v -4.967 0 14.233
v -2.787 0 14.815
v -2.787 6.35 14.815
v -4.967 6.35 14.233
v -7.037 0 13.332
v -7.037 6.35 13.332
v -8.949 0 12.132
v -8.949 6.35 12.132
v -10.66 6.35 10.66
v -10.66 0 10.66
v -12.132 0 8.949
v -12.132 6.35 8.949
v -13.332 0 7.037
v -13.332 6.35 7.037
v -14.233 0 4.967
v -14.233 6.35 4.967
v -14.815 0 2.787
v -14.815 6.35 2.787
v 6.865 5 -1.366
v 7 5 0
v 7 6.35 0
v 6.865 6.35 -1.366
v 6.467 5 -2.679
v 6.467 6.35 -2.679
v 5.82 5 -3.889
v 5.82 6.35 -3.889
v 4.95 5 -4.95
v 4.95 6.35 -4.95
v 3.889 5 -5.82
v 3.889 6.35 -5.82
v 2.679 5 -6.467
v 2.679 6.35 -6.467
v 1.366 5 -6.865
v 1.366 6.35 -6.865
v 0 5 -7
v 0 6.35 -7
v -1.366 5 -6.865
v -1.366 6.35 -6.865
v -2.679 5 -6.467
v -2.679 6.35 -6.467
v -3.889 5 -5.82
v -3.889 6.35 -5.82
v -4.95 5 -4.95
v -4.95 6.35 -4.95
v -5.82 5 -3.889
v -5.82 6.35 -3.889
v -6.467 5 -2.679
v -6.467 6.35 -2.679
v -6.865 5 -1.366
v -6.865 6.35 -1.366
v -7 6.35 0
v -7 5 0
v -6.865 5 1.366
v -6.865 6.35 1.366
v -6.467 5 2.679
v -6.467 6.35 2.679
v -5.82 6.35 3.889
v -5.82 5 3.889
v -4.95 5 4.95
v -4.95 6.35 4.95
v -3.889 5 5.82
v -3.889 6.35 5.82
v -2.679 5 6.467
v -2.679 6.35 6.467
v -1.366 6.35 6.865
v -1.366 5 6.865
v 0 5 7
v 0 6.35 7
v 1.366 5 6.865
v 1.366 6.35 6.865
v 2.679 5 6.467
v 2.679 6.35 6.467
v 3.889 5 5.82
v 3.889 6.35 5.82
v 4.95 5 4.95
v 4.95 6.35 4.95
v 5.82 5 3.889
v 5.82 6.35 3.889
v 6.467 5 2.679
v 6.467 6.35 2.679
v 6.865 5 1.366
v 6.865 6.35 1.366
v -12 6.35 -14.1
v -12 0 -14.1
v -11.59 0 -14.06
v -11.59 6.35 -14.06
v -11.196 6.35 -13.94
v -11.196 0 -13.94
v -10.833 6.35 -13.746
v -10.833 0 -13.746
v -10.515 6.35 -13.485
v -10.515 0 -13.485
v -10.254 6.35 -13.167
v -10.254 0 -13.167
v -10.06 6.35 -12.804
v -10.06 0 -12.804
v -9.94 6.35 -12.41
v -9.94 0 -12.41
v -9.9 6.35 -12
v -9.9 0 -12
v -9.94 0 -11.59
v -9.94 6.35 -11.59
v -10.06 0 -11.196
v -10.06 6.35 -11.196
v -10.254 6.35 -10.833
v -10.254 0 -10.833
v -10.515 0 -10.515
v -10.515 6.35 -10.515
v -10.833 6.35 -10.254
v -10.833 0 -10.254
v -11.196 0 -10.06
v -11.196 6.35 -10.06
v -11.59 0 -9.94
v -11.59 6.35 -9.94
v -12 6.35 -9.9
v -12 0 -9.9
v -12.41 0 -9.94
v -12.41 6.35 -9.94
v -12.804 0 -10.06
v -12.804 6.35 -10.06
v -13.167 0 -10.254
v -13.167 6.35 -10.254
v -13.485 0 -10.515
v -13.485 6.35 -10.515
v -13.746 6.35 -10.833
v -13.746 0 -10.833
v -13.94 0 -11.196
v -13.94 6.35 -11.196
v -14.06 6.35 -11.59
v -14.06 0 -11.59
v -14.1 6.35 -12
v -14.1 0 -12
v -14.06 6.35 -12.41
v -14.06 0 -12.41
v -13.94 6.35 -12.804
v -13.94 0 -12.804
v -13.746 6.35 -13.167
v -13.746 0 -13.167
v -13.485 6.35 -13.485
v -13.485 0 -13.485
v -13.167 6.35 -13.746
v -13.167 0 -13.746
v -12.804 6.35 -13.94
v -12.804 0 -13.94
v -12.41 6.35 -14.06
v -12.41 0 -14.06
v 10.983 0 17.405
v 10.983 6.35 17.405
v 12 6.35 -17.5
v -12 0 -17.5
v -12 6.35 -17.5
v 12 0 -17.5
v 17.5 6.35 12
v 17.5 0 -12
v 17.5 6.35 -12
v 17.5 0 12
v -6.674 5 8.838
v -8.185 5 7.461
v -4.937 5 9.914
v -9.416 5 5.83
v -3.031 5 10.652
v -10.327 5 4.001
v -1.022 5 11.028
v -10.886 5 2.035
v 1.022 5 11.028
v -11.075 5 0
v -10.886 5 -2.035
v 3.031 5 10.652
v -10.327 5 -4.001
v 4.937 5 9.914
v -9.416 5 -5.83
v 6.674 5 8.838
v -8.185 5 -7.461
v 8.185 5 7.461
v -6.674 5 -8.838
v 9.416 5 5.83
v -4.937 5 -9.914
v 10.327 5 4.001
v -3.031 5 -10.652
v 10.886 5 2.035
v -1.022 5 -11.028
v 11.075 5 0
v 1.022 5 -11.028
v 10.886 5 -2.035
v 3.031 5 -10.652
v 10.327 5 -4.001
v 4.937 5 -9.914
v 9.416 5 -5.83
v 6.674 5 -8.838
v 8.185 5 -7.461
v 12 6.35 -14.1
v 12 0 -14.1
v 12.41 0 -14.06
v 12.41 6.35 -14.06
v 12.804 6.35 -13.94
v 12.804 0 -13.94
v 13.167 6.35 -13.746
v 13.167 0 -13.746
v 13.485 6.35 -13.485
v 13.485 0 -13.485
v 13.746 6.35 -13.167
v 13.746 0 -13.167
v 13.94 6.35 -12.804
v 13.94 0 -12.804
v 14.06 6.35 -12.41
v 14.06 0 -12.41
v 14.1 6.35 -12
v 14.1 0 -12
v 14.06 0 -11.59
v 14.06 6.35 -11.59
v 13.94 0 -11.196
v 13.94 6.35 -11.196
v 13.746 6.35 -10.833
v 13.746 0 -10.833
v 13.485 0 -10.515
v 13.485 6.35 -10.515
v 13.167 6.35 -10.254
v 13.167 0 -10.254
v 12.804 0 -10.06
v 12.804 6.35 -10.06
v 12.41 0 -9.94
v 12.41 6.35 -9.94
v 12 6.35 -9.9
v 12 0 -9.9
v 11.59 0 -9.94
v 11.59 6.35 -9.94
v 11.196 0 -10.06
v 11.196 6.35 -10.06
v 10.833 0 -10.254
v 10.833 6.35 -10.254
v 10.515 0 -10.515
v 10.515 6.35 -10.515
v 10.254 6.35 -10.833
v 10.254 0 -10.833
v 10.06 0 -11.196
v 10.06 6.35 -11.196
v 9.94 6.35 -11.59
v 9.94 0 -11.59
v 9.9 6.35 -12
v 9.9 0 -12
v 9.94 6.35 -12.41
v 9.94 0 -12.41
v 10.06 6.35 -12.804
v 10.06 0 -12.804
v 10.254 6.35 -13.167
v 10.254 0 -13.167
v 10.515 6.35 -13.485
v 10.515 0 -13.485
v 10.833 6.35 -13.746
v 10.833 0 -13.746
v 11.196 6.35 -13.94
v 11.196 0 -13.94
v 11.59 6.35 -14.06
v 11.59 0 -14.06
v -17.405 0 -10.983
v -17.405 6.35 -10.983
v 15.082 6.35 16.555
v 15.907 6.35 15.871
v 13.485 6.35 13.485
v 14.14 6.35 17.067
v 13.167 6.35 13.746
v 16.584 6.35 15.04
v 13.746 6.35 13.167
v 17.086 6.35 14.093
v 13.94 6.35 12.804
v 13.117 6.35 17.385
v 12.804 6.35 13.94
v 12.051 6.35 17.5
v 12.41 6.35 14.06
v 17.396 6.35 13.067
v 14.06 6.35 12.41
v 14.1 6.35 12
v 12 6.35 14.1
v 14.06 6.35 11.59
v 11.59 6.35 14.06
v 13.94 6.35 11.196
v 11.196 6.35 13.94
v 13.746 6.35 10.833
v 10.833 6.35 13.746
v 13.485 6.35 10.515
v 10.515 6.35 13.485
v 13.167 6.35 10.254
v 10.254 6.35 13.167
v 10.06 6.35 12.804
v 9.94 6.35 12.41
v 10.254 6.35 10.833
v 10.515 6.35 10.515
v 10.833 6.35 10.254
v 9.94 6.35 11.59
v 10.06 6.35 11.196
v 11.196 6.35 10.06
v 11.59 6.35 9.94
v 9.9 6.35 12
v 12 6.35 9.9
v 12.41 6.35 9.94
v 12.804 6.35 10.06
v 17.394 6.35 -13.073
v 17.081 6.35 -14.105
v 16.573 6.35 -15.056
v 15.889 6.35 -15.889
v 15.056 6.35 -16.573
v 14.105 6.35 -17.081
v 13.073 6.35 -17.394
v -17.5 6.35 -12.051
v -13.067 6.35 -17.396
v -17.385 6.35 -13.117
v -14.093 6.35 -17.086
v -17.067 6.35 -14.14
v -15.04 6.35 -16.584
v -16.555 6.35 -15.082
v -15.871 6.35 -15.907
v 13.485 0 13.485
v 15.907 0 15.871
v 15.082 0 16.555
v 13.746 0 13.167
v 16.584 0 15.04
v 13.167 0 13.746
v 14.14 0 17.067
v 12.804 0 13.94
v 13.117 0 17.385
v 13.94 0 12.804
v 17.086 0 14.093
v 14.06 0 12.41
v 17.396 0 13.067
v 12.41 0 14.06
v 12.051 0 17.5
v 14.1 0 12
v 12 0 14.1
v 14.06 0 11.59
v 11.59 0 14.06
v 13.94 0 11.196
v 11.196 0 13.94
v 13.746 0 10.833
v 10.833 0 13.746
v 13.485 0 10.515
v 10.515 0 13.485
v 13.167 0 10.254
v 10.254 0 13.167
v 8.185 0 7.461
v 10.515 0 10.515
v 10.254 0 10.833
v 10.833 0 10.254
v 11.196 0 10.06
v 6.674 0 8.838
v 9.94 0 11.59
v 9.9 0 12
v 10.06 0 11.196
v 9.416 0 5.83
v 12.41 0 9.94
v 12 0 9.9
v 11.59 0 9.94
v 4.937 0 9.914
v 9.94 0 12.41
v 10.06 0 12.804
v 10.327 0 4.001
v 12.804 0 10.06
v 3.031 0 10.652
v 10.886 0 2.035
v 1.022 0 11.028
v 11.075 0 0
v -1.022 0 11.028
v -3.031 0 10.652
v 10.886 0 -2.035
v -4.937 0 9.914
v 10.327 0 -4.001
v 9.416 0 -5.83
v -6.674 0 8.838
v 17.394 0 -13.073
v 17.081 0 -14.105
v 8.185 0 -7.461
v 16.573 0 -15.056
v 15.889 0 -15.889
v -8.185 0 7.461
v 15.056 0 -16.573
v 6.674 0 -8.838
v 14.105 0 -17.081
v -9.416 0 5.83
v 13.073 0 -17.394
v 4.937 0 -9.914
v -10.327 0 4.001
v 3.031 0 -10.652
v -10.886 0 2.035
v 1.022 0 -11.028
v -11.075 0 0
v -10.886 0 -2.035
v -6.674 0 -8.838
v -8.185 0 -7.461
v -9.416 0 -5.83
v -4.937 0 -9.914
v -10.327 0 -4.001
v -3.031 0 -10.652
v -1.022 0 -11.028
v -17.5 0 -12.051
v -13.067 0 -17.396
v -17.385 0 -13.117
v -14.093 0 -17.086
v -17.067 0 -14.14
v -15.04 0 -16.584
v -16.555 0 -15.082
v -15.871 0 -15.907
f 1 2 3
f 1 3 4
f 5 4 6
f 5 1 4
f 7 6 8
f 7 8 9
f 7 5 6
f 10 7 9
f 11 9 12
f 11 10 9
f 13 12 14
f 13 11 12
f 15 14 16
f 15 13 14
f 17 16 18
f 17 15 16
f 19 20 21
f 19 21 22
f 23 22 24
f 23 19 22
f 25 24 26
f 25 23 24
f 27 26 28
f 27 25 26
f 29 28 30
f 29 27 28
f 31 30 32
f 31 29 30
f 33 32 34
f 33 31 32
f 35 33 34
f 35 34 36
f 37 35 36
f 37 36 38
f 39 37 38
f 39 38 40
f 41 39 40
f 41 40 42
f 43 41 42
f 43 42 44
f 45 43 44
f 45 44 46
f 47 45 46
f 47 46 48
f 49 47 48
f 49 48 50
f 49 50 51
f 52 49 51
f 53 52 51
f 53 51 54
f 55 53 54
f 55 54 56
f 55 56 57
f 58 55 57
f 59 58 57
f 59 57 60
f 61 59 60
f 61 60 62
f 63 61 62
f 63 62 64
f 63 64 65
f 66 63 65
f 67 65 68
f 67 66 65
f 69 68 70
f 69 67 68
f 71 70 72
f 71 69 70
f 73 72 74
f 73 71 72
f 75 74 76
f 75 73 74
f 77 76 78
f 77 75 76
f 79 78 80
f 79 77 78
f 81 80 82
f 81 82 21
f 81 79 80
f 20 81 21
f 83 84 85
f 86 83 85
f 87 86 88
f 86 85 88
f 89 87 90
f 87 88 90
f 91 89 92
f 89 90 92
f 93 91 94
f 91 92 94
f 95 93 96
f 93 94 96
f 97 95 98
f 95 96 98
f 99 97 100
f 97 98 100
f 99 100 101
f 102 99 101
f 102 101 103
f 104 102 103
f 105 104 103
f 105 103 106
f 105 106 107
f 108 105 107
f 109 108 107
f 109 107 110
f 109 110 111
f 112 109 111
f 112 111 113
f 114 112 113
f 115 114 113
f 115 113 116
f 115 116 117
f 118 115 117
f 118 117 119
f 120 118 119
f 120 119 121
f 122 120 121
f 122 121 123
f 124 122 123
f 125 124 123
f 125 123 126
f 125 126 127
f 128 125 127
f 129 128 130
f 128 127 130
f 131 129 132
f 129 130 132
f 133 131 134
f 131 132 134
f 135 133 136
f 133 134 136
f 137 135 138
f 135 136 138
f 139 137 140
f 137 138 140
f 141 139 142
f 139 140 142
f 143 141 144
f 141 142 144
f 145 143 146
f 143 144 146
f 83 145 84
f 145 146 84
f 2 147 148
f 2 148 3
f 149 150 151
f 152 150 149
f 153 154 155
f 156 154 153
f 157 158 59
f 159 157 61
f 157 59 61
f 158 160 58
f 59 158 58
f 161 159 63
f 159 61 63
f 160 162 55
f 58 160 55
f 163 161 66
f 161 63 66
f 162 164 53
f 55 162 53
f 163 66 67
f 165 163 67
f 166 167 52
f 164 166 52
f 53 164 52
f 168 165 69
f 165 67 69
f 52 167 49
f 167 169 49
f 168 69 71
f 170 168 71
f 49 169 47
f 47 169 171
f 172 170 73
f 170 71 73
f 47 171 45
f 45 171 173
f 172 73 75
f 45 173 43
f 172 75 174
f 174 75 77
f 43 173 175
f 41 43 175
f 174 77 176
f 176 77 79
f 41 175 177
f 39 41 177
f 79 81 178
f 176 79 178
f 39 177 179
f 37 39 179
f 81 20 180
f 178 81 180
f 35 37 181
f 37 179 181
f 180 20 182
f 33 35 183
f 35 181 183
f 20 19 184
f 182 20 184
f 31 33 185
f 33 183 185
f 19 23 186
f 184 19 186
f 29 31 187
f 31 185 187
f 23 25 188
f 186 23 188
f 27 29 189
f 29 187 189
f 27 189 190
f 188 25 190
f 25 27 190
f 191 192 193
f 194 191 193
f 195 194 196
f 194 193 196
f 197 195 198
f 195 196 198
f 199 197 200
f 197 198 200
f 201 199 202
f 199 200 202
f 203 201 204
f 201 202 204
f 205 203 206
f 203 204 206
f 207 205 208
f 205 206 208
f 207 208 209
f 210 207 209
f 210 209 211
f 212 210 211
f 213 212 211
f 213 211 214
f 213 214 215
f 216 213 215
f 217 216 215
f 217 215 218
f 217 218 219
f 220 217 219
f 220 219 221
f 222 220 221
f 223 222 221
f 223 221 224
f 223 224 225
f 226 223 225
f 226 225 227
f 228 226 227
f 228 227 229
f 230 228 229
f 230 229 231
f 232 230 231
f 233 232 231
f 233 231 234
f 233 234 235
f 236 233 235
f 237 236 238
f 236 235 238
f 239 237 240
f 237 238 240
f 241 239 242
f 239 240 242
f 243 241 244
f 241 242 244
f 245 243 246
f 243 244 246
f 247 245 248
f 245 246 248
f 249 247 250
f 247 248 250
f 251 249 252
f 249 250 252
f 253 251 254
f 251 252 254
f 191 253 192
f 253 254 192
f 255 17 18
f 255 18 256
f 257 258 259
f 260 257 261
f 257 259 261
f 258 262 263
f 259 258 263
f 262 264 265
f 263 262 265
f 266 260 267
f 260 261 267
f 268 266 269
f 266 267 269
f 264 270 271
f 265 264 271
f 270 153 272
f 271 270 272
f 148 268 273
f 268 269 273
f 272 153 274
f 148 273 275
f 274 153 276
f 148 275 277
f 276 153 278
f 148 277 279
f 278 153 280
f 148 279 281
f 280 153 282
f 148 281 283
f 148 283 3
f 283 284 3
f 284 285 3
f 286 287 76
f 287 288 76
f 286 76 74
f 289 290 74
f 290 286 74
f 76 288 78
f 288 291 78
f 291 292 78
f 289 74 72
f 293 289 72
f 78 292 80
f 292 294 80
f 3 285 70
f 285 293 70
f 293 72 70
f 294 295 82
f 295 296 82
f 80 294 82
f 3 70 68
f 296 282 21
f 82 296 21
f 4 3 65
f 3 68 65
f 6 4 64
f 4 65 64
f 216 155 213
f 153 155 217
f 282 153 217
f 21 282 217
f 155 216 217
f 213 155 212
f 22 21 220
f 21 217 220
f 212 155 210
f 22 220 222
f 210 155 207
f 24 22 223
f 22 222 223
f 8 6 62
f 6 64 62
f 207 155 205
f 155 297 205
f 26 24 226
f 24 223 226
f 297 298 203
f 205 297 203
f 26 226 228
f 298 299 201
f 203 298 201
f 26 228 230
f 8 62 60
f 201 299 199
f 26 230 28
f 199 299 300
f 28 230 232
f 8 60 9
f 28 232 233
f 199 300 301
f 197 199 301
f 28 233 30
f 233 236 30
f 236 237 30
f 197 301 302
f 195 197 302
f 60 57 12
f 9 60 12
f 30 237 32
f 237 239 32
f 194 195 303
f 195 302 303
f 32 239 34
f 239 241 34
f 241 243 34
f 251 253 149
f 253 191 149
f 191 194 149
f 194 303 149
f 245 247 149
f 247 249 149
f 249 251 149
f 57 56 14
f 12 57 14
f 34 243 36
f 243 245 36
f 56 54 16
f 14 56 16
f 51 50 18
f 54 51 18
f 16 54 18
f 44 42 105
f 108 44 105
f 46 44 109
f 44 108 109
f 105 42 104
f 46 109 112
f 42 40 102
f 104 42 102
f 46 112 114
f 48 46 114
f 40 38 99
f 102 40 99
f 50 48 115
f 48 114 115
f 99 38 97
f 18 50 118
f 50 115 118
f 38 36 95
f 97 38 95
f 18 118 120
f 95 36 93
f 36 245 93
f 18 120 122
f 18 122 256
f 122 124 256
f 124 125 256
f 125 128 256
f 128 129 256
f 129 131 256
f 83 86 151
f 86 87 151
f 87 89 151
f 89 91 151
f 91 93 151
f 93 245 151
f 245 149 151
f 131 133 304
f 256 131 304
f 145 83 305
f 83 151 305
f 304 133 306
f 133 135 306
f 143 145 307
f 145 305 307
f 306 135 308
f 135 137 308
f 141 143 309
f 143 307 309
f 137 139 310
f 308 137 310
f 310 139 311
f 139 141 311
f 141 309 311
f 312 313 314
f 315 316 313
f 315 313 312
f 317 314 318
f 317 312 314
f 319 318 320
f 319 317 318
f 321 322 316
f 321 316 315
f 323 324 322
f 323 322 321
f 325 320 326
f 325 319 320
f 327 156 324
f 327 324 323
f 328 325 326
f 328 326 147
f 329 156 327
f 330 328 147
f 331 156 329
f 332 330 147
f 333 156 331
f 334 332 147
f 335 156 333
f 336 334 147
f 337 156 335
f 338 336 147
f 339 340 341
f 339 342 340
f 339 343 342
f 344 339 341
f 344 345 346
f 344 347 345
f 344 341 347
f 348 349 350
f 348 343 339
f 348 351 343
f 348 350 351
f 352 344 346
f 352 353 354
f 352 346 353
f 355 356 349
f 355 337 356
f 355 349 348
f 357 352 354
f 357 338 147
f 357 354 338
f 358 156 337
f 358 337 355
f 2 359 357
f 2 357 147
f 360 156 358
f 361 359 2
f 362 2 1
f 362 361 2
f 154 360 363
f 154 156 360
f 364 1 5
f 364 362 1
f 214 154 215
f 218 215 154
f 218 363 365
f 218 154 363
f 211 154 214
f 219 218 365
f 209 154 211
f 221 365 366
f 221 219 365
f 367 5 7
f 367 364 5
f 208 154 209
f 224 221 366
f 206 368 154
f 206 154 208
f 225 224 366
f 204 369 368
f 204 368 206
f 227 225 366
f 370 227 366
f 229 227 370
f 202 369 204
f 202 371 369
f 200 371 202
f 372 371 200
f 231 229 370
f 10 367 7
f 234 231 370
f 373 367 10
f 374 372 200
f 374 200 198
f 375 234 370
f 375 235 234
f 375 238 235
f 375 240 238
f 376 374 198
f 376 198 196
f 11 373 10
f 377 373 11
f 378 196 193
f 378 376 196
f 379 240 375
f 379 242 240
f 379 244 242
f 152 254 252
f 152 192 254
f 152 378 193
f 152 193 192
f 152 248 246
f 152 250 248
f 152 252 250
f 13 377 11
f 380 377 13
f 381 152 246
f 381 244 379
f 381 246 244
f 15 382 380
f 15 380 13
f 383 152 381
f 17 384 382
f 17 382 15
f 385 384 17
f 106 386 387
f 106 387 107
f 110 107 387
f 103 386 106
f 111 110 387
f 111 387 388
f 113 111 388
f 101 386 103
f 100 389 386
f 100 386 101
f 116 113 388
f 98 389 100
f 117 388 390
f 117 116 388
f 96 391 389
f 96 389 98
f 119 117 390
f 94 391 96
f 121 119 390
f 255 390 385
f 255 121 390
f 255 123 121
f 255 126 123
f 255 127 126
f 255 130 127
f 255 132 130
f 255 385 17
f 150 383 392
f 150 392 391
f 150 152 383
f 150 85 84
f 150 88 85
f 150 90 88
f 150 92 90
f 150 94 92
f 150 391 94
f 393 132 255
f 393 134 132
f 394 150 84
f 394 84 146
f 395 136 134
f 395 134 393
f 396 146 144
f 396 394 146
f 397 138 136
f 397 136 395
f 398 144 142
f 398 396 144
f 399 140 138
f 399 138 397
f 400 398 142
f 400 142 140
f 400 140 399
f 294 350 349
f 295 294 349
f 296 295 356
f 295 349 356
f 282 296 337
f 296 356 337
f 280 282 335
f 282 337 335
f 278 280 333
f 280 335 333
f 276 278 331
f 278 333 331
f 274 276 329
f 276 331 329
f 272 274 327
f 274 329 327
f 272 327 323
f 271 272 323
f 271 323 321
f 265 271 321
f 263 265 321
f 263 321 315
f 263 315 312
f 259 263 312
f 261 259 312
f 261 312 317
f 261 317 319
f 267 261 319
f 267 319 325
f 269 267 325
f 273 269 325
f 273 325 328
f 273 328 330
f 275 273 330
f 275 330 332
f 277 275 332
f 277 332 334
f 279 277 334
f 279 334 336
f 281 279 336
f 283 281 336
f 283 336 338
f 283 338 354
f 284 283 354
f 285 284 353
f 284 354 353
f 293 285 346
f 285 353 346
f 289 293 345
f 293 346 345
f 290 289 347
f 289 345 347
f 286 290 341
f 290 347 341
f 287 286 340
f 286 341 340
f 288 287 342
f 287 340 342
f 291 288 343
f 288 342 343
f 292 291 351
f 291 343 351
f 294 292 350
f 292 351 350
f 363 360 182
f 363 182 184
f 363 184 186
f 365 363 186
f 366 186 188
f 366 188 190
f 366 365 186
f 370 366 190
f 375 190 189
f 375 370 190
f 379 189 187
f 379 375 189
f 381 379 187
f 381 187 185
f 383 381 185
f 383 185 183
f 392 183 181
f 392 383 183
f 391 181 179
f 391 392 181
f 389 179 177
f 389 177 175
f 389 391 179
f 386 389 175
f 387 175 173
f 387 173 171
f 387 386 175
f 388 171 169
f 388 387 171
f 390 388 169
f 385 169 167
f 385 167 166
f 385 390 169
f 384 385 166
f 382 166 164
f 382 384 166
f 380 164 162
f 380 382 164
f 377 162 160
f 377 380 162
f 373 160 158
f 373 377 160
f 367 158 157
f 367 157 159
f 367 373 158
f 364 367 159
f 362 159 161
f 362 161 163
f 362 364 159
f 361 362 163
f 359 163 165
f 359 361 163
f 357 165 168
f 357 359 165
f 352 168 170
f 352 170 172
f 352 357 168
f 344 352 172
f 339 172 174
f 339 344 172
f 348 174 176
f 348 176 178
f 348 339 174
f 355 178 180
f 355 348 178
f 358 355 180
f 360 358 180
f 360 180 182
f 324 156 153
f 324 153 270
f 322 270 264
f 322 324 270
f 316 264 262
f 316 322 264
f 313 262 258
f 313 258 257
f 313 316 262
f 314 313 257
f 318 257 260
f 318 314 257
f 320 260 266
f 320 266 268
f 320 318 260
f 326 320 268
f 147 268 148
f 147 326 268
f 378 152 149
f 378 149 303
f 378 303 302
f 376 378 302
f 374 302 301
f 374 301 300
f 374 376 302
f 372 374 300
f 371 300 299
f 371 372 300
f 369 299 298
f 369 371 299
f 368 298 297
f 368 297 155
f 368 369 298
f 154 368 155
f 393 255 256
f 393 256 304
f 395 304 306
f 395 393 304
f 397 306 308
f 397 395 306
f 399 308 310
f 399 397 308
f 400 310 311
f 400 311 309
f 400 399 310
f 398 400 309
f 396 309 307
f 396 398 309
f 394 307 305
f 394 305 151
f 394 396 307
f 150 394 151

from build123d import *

# Parameters (mm, degrees)
SKETCH1_R             = 7
BOSS_EXTRUDE1_DEPTH   = 6.35
SKETCH1_3_R           = 11.075
CUT_EXTRUDE1_DEPTH    = 5
M5X0_8_TAPPED_HOLE1_D = 4.2


with BuildPart() as part:
    # Sketch1 → Boss-Extrude1 (new body)
    with BuildSketch(Plane(origin=(0, 0, 0), x_dir=(1, 0, 0), z_dir=(0, 1, 0))):
        with BuildLine():
            Line((-12, 17.5), (12, 17.5))
            ThreePointArc((12, 17.5), (15.889087297, 15.889087297), (17.5, 12))
            Line((17.5, 12), (17.5, -12))
            ThreePointArc((17.5, -12), (15.511287903, -16.233303351), (10.983324632, -17.405217035))
            Line((10.983324632, -17.405217035), (-2.78661476, -14.81520851))
            ThreePointArc((-2.78661476, -14.81520851), (-10.659634726, -10.659634726), (-14.81520851, -2.78661476))
            Line((-14.81520851, -2.78661476), (-17.405217035, 10.983324632))
            ThreePointArc((-17.405217035, 10.983324632), (-16.233303351, 15.511287903), (-12, 17.5))
        make_face()
        Circle(SKETCH1_R, mode=Mode.SUBTRACT)
    extrude(amount=BOSS_EXTRUDE1_DEPTH)

    # Sketch1<3> → Cut-Extrude1 (cut)
    with BuildSketch(Plane(origin=(0, 0, 0), x_dir=(1, 0, 0), z_dir=(0, 1, 0))):
        Circle(SKETCH1_3_R)
    extrude(amount=CUT_EXTRUDE1_DEPTH, mode=Mode.SUBTRACT)

    # M5x0.8 Tapped Hole1 (through all)
    with Locations(Plane(origin=(12, 6.35, -12), x_dir=(0, 0, 1), z_dir=(0, 1, 0))):
        with Locations((0, 0), (24, 0), (0, -24)):
            Hole(M5X0_8_TAPPED_HOLE1_D / 2)


solid = part.part
